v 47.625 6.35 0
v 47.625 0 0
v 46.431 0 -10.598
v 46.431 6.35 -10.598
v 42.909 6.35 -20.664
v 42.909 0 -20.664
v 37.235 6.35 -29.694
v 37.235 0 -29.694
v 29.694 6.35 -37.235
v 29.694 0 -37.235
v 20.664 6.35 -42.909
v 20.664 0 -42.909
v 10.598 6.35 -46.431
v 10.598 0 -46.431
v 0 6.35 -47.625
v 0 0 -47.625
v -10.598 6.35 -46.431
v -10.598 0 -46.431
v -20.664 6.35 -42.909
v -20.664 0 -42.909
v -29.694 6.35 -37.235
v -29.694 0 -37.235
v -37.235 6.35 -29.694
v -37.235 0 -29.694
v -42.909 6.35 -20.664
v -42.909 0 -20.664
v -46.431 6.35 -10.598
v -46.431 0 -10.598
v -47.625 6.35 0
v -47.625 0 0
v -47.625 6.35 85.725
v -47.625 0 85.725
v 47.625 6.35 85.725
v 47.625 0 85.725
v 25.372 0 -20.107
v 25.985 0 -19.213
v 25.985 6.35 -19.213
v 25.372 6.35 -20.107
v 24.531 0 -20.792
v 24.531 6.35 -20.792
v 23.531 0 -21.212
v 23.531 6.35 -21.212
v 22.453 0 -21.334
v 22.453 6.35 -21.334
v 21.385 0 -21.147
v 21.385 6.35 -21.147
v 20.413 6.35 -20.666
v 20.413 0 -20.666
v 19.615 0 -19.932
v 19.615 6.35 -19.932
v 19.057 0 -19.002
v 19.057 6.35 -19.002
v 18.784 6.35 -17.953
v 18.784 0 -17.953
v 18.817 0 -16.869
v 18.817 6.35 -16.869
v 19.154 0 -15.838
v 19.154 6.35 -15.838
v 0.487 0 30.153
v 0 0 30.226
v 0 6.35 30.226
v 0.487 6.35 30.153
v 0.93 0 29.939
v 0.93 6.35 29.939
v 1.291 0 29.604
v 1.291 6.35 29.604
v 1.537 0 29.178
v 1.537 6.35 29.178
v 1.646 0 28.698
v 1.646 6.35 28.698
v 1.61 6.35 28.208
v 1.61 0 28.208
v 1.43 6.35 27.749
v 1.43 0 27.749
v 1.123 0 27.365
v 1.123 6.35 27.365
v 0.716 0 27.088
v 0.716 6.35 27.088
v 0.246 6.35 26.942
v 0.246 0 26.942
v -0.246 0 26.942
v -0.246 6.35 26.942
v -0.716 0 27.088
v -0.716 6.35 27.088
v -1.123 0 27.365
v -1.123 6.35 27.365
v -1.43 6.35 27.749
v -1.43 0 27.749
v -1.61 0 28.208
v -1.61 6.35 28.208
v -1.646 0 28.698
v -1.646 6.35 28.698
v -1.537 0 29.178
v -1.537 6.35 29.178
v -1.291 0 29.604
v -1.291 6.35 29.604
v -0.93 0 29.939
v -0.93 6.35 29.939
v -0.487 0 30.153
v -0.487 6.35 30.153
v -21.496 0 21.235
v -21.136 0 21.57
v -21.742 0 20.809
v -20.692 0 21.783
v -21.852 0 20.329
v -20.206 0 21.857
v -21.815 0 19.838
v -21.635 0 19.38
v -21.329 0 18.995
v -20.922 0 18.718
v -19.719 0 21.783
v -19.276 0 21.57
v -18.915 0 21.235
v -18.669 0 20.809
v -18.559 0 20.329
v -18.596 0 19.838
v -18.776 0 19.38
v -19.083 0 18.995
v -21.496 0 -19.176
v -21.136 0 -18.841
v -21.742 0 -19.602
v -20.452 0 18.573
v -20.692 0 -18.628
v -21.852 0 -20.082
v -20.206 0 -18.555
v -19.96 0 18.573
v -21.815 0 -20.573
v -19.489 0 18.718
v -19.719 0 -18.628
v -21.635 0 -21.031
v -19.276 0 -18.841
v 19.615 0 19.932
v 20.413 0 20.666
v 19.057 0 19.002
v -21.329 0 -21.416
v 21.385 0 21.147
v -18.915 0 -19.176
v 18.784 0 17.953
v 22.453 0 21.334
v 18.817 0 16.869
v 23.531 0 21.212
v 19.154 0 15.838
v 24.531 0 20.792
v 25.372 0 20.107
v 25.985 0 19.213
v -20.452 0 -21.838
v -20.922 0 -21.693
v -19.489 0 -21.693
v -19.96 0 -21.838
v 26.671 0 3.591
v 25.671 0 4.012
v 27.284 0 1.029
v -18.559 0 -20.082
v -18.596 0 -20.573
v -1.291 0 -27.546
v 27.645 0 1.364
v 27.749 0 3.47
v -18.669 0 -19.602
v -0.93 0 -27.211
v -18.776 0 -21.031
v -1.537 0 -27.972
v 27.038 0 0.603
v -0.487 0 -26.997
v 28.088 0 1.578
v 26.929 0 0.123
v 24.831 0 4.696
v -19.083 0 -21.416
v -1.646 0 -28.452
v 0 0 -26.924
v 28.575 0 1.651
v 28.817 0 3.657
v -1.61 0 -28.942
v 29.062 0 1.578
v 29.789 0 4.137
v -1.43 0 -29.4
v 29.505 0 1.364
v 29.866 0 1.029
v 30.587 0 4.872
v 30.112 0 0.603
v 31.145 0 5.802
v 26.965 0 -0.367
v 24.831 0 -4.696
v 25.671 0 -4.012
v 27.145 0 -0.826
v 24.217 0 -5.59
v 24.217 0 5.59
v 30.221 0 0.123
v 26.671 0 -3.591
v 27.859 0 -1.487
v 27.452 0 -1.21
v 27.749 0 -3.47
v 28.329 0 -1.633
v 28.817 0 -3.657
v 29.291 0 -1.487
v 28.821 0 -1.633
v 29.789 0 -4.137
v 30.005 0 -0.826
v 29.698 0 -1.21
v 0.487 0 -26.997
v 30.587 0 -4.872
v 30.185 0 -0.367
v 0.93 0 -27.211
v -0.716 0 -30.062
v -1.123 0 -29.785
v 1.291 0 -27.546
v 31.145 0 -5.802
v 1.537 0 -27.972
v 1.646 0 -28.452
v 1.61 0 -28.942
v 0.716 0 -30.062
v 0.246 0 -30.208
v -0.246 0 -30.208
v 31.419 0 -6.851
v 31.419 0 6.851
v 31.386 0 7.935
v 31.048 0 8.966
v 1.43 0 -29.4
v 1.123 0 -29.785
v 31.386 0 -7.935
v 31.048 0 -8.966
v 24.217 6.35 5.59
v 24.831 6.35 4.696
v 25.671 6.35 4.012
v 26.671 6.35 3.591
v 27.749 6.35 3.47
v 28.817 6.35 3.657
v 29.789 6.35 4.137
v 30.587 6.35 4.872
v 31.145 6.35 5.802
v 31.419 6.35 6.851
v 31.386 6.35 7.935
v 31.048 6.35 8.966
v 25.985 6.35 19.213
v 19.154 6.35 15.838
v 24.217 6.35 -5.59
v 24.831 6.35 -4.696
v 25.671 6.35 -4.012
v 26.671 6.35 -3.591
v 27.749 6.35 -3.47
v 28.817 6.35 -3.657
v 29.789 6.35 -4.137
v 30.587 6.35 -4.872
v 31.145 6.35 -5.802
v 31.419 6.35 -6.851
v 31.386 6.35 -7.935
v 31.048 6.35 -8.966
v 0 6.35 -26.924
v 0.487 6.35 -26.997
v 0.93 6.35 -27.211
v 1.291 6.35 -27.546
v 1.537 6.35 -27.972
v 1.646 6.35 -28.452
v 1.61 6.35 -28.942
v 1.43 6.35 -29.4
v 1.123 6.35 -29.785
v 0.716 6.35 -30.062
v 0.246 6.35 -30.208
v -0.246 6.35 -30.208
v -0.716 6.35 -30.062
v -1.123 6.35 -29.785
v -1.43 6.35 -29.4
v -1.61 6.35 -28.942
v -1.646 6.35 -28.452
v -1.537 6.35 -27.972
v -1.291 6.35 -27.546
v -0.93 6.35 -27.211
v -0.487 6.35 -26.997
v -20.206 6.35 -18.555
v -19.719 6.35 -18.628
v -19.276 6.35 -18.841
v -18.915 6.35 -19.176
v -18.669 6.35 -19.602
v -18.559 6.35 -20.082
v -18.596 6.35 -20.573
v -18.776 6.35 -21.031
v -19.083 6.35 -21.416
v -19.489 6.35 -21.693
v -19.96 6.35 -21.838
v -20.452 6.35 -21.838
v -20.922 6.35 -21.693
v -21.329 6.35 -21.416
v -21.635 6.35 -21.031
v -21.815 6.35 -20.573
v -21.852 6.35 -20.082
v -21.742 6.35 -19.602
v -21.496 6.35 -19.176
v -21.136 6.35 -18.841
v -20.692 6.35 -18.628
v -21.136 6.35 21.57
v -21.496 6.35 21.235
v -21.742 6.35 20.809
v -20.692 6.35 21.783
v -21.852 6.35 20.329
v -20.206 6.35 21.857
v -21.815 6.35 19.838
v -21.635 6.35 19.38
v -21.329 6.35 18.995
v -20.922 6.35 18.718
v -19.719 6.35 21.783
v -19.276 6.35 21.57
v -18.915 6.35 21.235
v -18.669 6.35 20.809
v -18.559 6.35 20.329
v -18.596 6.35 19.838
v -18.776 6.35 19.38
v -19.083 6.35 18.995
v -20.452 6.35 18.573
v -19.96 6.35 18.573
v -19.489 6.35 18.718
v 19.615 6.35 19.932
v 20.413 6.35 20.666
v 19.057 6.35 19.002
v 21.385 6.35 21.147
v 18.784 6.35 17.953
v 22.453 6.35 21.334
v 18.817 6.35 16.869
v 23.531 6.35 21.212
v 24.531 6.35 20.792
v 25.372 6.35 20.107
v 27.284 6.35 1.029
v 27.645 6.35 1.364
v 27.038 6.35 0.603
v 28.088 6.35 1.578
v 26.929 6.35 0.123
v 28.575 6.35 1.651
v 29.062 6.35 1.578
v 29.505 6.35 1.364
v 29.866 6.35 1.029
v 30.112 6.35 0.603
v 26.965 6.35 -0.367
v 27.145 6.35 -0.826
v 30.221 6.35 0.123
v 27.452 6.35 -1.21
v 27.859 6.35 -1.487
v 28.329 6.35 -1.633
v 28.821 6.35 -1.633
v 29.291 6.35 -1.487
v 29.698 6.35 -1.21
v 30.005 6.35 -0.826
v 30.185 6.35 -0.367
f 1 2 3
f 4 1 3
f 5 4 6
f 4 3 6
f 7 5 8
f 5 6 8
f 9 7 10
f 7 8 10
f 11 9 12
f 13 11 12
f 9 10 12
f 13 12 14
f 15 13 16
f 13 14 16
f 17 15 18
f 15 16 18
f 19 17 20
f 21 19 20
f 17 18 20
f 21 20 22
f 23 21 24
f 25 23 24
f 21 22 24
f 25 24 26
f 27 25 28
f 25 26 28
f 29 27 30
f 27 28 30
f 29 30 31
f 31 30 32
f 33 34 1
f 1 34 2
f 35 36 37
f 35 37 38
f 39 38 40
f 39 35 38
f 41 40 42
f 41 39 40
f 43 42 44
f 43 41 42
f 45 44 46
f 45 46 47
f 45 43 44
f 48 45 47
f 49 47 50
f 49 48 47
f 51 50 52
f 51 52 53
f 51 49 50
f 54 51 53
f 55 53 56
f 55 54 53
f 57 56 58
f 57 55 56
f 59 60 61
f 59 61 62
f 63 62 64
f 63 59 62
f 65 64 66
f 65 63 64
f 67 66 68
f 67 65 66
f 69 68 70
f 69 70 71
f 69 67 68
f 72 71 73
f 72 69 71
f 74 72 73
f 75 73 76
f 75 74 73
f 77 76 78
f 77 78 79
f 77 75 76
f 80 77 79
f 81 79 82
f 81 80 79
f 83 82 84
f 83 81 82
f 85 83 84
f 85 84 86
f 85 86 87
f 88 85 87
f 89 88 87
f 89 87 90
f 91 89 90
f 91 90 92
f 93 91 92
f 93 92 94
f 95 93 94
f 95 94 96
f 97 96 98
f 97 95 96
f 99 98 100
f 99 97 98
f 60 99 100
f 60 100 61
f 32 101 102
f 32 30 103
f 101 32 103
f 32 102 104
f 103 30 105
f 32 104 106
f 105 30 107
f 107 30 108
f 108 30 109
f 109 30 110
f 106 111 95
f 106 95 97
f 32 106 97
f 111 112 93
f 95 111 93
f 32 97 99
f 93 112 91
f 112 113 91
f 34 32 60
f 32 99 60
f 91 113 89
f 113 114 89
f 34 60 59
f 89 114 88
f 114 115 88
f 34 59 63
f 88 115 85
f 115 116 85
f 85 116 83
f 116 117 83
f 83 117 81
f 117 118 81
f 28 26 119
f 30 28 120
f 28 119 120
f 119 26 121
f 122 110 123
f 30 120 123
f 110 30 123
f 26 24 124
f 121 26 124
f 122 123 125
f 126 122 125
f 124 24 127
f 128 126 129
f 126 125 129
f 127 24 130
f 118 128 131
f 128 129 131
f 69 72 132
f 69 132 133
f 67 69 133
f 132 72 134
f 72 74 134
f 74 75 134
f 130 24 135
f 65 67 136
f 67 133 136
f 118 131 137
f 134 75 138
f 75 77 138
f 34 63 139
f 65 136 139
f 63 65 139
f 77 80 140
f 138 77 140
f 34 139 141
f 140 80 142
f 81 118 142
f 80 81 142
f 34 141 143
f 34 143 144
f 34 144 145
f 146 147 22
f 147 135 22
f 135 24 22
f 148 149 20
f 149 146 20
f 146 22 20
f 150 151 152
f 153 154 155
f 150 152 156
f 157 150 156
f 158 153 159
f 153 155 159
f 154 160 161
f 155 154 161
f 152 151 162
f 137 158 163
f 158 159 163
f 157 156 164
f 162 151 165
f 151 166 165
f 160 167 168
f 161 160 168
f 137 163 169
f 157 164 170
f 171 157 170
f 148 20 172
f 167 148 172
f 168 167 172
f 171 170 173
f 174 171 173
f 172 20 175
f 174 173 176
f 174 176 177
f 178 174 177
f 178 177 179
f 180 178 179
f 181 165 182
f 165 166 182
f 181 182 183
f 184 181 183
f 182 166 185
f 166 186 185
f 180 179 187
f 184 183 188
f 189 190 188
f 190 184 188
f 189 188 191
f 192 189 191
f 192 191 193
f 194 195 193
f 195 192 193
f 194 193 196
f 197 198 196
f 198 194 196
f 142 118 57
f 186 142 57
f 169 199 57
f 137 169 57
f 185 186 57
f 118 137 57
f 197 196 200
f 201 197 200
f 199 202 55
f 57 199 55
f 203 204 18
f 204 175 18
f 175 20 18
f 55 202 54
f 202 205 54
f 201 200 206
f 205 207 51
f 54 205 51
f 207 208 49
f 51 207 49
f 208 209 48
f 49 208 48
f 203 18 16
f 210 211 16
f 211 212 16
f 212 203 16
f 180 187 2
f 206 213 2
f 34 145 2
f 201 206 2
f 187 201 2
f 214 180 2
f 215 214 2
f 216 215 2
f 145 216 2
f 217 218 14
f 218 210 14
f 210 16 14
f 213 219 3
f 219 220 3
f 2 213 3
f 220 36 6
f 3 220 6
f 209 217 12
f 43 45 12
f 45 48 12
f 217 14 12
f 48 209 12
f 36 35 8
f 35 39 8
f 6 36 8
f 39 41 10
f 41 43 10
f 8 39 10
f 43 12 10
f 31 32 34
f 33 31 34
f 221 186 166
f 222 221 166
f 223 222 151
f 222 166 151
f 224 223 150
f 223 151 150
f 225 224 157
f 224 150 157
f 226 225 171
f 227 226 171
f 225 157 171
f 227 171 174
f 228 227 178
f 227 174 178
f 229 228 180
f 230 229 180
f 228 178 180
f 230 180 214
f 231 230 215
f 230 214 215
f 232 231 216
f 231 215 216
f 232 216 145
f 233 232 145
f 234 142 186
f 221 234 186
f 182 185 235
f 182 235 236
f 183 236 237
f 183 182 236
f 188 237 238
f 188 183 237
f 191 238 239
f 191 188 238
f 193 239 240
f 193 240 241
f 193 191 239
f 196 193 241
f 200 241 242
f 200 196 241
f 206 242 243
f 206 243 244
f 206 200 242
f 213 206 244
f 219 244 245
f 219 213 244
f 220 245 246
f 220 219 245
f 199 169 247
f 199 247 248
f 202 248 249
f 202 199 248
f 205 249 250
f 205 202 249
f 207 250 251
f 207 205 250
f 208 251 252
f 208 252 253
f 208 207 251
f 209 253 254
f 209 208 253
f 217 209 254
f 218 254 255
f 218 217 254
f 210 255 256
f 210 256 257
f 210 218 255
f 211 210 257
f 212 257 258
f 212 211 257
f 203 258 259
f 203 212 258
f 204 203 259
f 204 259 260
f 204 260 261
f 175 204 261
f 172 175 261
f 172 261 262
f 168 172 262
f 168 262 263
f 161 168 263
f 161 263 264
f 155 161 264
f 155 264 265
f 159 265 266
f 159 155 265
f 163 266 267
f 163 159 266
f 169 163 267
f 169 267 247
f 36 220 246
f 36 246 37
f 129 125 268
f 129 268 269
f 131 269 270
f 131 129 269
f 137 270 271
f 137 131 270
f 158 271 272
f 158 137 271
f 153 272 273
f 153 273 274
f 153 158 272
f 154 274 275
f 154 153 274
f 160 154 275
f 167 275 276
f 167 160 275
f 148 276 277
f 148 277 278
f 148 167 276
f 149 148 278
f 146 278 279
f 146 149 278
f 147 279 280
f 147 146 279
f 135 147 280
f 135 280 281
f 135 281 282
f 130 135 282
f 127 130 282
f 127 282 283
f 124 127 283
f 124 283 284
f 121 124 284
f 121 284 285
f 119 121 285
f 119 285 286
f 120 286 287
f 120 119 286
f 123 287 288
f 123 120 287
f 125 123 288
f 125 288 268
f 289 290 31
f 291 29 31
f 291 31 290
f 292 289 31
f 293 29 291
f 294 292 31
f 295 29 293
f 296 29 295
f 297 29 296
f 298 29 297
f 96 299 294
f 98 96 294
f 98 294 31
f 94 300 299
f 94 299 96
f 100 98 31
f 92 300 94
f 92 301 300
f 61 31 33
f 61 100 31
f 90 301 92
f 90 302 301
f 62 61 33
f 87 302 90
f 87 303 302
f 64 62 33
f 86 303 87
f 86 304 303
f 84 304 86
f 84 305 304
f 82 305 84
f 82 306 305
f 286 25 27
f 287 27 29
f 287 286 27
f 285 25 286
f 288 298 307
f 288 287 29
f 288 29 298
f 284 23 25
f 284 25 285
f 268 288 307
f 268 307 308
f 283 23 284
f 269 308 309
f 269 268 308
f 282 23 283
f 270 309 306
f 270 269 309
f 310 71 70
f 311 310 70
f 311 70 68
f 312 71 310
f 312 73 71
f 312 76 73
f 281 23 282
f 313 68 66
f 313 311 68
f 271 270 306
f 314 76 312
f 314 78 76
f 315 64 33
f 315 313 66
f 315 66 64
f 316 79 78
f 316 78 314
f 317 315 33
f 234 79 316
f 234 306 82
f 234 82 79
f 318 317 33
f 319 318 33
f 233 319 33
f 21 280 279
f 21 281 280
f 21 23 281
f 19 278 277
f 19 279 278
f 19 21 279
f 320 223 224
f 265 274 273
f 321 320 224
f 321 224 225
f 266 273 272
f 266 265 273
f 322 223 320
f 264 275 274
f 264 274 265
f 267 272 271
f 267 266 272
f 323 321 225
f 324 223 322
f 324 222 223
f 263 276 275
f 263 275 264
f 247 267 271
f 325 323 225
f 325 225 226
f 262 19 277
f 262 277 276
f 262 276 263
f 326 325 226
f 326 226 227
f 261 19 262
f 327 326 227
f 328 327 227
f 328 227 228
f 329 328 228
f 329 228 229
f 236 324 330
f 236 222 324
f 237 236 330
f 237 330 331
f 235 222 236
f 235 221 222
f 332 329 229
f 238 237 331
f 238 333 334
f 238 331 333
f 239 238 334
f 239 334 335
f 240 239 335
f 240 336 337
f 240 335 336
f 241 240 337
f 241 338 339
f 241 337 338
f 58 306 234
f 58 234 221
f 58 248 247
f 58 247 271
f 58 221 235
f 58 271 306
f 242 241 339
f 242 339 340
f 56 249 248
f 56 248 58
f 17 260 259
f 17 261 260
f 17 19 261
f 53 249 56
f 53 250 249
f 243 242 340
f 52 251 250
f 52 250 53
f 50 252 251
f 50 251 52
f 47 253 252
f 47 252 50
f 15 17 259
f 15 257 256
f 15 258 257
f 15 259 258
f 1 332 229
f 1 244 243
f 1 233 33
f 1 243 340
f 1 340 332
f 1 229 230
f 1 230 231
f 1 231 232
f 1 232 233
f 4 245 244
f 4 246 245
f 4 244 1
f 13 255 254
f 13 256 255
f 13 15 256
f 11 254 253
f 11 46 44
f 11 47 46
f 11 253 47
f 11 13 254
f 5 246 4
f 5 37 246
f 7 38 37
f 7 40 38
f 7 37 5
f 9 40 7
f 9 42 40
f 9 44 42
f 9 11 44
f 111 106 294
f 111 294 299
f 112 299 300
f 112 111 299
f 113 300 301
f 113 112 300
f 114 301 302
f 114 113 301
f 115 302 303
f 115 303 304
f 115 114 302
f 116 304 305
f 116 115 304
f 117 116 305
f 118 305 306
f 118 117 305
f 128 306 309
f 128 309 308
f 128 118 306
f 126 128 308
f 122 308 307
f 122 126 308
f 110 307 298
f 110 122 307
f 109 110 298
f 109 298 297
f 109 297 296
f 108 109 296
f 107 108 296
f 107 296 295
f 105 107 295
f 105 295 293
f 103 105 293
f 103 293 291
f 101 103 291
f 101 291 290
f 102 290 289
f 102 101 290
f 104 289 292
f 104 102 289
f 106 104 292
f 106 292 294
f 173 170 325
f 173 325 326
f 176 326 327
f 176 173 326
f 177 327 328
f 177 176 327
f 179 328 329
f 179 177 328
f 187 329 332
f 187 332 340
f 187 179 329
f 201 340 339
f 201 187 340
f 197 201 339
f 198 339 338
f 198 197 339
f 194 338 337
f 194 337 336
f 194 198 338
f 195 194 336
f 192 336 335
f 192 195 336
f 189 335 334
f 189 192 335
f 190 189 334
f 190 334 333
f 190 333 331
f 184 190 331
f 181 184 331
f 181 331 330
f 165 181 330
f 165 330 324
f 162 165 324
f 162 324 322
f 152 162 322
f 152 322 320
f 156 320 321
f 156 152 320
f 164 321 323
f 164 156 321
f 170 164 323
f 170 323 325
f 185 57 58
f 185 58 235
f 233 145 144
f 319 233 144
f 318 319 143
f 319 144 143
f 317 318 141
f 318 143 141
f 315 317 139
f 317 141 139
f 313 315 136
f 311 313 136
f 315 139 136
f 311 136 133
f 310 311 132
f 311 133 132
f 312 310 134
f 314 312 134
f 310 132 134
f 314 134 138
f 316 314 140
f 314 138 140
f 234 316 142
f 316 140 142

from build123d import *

# Parameters (mm, degrees)
SKETCH1_R           = 47.625
SKETCH1_R_2         = 1.651
BOSS_EXTRUDE1_DEPTH = 6.35


with BuildPart() as part:
    # Sketch1 → Boss-Extrude1 (new body)
    # profile 1 of 3: a face of its own
    with BuildSketch(Plane(origin=(0, 0, 0), x_dir=(1, 0, 0), z_dir=(0, 1, 0))):
        Circle(SKETCH1_R)
        with Locations(Location((0, 28.575, 0), (0, 0, 270))):
            Circle(SKETCH1_R_2, mode=Mode.SUBTRACT)
        with Locations(Location((0, -28.575, 0), (0, 0, 270))):
            Circle(SKETCH1_R_2, mode=Mode.SUBTRACT)
        with Locations(Location((28.575, 0, 0), (0, 0, 270))):
            Circle(SKETCH1_R_2, mode=Mode.SUBTRACT)
        with Locations(Location((-20.205576272, 20.205576272, 0), (0, 0, 270))):
            Circle(SKETCH1_R_2, mode=Mode.SUBTRACT)
        with Locations(Location((-20.205576272, -20.205576272, 0), (0, 0, 270))):
            Circle(SKETCH1_R_2, mode=Mode.SUBTRACT)
        with BuildLine():
            ThreePointArc((25.985410077, 19.213209427), (20.881913097, 20.941364101), (19.153758423, 15.837867121))
            Line((19.153758423, 15.837867121), (24.216771881, 5.59038964))
            ThreePointArc((24.216771881, 5.59038964), (29.320268861, 3.862234966), (31.048423535, 8.965731946))
            Line((31.048423535, 8.965731946), (25.985410077, 19.213209427))
        make_face(mode=Mode.SUBTRACT)
        with BuildLine():
            Line((31.048423535, -8.965731946), (25.985410077, -19.213209427))
            ThreePointArc((25.985410077, -19.213209427), (20.881913097, -20.941364101), (19.153758423, -15.837867121))
            Line((19.153758423, -15.837867121), (24.216771881, -5.59038964))
            ThreePointArc((24.216771881, -5.59038964), (29.320268861, -3.862234966), (31.048423535, -8.965731946))
        make_face(mode=Mode.SUBTRACT)
    # profile 2 of 3: a face of its own
    with BuildSketch(Plane(origin=(0, 0, 0), x_dir=(1, 0, 0), z_dir=(0, 1, 0))):
        with BuildLine():
            Line((0, -85.725), (0, -47.625))
            ThreePointArc((0, -47.625), (-33.675960454, -33.675960454), (-47.625, 0))
            Line((-47.625, 0), (-47.625, -85.725))
            Line((-47.625, -85.725), (0, -85.725))
        make_face()
    # profile 3 of 3: a face of its own
    with BuildSketch(Plane(origin=(0, 0, 0), x_dir=(1, 0, 0), z_dir=(0, 1, 0))):
        with BuildLine():
            ThreePointArc((47.625, 0), (33.675960454, -33.675960454), (0, -47.625))
            Line((0, -47.625), (0, -85.725))
            Line((0, -85.725), (47.625, -85.725))
            Line((47.625, -85.725), (47.625, 0))
        make_face()
    extrude(amount=BOSS_EXTRUDE1_DEPTH)


solid = part.part
